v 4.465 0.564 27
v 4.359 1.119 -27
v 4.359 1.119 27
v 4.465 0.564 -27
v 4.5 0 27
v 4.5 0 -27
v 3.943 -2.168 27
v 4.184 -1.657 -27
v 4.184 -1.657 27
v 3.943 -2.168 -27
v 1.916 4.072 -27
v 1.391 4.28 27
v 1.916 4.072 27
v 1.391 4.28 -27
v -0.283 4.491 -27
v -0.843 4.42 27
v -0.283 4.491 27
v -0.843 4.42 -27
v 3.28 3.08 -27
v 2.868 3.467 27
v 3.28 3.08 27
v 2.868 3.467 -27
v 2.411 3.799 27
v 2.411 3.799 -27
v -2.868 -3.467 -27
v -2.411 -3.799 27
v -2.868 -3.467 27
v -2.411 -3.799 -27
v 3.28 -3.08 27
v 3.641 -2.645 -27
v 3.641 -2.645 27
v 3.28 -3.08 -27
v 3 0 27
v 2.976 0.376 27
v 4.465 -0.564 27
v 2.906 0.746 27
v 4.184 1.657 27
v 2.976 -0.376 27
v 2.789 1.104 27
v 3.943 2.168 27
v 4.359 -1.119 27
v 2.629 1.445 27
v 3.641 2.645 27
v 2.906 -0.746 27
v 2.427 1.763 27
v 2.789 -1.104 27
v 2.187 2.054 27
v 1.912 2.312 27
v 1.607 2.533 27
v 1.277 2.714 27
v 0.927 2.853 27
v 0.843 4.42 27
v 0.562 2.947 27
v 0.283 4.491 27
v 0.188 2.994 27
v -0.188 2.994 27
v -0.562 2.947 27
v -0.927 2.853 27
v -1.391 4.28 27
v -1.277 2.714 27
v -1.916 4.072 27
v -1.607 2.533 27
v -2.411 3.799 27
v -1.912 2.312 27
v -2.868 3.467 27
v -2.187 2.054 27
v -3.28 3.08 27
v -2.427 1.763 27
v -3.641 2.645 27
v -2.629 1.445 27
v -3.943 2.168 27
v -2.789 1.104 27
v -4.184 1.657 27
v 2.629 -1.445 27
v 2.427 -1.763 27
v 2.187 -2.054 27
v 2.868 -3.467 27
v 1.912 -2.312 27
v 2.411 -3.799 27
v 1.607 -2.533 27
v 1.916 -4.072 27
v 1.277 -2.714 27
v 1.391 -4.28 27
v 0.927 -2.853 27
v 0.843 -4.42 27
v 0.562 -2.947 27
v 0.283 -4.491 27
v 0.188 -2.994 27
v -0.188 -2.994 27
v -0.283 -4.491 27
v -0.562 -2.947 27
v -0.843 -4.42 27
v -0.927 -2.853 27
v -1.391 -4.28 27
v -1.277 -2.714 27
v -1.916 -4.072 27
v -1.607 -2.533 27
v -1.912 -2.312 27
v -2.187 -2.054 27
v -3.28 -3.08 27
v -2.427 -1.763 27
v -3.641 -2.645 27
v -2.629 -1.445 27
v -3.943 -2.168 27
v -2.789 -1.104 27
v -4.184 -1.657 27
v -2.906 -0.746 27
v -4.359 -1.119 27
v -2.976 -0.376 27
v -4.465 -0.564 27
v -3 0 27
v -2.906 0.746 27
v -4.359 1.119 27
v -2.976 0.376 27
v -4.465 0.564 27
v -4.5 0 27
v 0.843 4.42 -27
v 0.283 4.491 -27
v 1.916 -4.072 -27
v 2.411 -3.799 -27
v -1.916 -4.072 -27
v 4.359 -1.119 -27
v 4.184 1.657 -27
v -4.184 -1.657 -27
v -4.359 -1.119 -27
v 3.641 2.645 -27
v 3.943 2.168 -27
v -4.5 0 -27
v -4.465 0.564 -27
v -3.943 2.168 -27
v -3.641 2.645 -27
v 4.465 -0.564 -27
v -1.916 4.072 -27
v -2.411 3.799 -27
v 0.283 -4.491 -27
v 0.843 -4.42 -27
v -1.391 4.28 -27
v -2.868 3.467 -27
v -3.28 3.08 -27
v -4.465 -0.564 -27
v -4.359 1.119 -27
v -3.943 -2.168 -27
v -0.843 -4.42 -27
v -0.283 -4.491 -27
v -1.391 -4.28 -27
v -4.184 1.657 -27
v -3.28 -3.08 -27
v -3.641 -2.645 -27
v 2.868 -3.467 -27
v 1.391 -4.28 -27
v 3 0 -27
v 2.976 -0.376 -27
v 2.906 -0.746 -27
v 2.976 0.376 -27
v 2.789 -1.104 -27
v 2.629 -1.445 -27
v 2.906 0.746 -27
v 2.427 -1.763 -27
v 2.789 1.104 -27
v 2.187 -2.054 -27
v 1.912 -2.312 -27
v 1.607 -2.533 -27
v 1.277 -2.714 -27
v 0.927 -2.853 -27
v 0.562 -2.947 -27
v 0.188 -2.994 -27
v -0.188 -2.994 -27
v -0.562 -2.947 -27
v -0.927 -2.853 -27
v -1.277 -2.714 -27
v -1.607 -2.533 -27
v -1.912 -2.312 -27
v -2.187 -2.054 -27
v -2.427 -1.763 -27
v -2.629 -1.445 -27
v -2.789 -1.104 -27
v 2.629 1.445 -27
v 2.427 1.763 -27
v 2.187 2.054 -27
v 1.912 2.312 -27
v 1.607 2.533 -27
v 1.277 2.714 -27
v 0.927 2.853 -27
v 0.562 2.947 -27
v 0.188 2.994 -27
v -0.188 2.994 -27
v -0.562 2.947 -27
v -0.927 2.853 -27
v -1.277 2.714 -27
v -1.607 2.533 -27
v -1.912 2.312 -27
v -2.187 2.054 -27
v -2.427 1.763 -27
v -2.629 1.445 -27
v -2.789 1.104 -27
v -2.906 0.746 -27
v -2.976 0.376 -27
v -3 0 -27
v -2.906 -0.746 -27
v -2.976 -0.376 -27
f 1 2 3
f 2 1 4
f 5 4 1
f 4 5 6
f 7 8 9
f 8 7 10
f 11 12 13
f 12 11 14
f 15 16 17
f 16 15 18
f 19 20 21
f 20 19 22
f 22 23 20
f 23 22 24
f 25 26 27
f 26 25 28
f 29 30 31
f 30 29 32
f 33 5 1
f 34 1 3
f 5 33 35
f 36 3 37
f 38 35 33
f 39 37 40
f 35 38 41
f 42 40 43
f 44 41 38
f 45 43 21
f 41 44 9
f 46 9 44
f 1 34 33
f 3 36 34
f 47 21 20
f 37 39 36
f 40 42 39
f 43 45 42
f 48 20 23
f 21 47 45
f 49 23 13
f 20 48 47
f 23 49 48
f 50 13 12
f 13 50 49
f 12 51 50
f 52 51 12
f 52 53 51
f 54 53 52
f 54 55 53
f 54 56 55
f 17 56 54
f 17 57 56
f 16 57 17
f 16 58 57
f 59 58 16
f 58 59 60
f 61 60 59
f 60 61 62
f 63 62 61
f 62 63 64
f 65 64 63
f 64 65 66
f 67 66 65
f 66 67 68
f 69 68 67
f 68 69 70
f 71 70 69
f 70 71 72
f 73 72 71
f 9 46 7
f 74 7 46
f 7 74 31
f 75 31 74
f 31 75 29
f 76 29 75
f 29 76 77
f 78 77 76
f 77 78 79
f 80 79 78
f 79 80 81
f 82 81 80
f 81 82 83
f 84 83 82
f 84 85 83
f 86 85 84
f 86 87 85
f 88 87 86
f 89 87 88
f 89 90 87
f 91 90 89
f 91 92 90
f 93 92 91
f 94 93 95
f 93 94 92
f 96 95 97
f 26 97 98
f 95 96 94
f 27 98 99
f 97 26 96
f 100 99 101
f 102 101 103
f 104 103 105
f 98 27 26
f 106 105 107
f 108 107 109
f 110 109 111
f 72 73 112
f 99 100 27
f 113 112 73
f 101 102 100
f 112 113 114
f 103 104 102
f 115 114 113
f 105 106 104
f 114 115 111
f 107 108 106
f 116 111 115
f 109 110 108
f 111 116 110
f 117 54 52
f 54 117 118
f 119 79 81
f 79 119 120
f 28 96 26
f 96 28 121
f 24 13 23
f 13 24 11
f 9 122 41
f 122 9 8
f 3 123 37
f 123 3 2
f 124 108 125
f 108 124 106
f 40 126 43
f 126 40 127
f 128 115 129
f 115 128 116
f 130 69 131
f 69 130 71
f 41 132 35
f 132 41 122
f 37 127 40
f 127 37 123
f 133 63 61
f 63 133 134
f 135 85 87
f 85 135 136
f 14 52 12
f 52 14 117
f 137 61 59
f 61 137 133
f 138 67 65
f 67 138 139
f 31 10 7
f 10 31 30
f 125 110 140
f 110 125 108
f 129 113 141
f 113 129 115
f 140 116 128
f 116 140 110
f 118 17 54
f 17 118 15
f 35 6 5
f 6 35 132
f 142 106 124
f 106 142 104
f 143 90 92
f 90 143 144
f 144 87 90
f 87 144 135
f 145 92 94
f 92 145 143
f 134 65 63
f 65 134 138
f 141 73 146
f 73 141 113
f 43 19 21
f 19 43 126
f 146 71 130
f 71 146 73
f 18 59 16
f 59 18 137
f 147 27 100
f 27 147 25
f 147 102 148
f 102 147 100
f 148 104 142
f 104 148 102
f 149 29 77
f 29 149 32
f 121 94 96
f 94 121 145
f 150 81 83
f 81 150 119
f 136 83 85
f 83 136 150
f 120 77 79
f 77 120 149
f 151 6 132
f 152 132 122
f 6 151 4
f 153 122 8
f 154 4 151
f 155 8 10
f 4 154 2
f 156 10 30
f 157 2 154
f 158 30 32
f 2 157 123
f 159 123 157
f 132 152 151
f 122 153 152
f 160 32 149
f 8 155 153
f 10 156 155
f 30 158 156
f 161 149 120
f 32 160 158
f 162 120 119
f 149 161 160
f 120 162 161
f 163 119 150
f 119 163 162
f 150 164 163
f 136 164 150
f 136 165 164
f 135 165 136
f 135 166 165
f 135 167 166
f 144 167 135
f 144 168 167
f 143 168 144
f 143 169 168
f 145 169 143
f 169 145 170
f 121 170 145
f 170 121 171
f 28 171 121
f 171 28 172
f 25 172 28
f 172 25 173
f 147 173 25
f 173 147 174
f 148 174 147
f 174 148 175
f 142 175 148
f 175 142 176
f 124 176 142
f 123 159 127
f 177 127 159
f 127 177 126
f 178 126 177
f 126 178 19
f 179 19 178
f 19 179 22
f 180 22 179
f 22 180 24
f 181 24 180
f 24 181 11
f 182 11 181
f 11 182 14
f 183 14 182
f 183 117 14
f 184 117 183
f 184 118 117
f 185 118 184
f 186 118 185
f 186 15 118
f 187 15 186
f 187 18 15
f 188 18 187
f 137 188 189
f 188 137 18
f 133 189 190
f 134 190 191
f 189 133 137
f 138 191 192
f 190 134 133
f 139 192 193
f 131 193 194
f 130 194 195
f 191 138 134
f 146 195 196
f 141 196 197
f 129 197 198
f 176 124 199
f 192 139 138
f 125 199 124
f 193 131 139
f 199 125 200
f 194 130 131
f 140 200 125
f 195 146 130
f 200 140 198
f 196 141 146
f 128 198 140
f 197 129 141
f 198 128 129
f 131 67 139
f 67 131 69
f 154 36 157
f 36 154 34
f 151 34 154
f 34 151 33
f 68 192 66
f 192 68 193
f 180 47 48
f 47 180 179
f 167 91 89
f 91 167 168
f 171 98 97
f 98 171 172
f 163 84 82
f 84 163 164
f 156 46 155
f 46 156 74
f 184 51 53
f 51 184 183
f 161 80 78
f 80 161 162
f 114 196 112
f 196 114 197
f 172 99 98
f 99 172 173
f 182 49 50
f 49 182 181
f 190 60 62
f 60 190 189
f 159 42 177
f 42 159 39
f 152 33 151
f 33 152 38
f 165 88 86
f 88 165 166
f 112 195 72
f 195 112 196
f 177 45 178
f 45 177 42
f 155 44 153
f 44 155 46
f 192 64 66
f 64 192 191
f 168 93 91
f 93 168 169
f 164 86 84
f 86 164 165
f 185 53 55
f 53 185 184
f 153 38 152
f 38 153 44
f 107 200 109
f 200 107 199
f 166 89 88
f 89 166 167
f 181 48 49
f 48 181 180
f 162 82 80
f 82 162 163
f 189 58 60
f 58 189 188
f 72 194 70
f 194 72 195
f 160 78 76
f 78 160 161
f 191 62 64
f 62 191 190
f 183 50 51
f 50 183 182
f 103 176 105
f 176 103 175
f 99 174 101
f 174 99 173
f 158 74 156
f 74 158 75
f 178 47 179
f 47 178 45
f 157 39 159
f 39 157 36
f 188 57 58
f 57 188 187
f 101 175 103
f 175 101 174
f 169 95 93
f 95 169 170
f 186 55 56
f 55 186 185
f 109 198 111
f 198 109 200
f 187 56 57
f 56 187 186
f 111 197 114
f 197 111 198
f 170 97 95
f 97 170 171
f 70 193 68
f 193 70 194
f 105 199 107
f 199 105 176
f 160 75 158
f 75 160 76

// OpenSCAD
$fn = 50;


difference() {
	union() {
		translate(v = [0, 0, -27.0000000000]) {
			cylinder(h = 54, r = 4.5000000000);
		}
	}
	union() {
		translate(v = [0, 0, -100.0000000000]) {
			cylinder(h = 200, r = 3.0000000000);
		}
	}
}
